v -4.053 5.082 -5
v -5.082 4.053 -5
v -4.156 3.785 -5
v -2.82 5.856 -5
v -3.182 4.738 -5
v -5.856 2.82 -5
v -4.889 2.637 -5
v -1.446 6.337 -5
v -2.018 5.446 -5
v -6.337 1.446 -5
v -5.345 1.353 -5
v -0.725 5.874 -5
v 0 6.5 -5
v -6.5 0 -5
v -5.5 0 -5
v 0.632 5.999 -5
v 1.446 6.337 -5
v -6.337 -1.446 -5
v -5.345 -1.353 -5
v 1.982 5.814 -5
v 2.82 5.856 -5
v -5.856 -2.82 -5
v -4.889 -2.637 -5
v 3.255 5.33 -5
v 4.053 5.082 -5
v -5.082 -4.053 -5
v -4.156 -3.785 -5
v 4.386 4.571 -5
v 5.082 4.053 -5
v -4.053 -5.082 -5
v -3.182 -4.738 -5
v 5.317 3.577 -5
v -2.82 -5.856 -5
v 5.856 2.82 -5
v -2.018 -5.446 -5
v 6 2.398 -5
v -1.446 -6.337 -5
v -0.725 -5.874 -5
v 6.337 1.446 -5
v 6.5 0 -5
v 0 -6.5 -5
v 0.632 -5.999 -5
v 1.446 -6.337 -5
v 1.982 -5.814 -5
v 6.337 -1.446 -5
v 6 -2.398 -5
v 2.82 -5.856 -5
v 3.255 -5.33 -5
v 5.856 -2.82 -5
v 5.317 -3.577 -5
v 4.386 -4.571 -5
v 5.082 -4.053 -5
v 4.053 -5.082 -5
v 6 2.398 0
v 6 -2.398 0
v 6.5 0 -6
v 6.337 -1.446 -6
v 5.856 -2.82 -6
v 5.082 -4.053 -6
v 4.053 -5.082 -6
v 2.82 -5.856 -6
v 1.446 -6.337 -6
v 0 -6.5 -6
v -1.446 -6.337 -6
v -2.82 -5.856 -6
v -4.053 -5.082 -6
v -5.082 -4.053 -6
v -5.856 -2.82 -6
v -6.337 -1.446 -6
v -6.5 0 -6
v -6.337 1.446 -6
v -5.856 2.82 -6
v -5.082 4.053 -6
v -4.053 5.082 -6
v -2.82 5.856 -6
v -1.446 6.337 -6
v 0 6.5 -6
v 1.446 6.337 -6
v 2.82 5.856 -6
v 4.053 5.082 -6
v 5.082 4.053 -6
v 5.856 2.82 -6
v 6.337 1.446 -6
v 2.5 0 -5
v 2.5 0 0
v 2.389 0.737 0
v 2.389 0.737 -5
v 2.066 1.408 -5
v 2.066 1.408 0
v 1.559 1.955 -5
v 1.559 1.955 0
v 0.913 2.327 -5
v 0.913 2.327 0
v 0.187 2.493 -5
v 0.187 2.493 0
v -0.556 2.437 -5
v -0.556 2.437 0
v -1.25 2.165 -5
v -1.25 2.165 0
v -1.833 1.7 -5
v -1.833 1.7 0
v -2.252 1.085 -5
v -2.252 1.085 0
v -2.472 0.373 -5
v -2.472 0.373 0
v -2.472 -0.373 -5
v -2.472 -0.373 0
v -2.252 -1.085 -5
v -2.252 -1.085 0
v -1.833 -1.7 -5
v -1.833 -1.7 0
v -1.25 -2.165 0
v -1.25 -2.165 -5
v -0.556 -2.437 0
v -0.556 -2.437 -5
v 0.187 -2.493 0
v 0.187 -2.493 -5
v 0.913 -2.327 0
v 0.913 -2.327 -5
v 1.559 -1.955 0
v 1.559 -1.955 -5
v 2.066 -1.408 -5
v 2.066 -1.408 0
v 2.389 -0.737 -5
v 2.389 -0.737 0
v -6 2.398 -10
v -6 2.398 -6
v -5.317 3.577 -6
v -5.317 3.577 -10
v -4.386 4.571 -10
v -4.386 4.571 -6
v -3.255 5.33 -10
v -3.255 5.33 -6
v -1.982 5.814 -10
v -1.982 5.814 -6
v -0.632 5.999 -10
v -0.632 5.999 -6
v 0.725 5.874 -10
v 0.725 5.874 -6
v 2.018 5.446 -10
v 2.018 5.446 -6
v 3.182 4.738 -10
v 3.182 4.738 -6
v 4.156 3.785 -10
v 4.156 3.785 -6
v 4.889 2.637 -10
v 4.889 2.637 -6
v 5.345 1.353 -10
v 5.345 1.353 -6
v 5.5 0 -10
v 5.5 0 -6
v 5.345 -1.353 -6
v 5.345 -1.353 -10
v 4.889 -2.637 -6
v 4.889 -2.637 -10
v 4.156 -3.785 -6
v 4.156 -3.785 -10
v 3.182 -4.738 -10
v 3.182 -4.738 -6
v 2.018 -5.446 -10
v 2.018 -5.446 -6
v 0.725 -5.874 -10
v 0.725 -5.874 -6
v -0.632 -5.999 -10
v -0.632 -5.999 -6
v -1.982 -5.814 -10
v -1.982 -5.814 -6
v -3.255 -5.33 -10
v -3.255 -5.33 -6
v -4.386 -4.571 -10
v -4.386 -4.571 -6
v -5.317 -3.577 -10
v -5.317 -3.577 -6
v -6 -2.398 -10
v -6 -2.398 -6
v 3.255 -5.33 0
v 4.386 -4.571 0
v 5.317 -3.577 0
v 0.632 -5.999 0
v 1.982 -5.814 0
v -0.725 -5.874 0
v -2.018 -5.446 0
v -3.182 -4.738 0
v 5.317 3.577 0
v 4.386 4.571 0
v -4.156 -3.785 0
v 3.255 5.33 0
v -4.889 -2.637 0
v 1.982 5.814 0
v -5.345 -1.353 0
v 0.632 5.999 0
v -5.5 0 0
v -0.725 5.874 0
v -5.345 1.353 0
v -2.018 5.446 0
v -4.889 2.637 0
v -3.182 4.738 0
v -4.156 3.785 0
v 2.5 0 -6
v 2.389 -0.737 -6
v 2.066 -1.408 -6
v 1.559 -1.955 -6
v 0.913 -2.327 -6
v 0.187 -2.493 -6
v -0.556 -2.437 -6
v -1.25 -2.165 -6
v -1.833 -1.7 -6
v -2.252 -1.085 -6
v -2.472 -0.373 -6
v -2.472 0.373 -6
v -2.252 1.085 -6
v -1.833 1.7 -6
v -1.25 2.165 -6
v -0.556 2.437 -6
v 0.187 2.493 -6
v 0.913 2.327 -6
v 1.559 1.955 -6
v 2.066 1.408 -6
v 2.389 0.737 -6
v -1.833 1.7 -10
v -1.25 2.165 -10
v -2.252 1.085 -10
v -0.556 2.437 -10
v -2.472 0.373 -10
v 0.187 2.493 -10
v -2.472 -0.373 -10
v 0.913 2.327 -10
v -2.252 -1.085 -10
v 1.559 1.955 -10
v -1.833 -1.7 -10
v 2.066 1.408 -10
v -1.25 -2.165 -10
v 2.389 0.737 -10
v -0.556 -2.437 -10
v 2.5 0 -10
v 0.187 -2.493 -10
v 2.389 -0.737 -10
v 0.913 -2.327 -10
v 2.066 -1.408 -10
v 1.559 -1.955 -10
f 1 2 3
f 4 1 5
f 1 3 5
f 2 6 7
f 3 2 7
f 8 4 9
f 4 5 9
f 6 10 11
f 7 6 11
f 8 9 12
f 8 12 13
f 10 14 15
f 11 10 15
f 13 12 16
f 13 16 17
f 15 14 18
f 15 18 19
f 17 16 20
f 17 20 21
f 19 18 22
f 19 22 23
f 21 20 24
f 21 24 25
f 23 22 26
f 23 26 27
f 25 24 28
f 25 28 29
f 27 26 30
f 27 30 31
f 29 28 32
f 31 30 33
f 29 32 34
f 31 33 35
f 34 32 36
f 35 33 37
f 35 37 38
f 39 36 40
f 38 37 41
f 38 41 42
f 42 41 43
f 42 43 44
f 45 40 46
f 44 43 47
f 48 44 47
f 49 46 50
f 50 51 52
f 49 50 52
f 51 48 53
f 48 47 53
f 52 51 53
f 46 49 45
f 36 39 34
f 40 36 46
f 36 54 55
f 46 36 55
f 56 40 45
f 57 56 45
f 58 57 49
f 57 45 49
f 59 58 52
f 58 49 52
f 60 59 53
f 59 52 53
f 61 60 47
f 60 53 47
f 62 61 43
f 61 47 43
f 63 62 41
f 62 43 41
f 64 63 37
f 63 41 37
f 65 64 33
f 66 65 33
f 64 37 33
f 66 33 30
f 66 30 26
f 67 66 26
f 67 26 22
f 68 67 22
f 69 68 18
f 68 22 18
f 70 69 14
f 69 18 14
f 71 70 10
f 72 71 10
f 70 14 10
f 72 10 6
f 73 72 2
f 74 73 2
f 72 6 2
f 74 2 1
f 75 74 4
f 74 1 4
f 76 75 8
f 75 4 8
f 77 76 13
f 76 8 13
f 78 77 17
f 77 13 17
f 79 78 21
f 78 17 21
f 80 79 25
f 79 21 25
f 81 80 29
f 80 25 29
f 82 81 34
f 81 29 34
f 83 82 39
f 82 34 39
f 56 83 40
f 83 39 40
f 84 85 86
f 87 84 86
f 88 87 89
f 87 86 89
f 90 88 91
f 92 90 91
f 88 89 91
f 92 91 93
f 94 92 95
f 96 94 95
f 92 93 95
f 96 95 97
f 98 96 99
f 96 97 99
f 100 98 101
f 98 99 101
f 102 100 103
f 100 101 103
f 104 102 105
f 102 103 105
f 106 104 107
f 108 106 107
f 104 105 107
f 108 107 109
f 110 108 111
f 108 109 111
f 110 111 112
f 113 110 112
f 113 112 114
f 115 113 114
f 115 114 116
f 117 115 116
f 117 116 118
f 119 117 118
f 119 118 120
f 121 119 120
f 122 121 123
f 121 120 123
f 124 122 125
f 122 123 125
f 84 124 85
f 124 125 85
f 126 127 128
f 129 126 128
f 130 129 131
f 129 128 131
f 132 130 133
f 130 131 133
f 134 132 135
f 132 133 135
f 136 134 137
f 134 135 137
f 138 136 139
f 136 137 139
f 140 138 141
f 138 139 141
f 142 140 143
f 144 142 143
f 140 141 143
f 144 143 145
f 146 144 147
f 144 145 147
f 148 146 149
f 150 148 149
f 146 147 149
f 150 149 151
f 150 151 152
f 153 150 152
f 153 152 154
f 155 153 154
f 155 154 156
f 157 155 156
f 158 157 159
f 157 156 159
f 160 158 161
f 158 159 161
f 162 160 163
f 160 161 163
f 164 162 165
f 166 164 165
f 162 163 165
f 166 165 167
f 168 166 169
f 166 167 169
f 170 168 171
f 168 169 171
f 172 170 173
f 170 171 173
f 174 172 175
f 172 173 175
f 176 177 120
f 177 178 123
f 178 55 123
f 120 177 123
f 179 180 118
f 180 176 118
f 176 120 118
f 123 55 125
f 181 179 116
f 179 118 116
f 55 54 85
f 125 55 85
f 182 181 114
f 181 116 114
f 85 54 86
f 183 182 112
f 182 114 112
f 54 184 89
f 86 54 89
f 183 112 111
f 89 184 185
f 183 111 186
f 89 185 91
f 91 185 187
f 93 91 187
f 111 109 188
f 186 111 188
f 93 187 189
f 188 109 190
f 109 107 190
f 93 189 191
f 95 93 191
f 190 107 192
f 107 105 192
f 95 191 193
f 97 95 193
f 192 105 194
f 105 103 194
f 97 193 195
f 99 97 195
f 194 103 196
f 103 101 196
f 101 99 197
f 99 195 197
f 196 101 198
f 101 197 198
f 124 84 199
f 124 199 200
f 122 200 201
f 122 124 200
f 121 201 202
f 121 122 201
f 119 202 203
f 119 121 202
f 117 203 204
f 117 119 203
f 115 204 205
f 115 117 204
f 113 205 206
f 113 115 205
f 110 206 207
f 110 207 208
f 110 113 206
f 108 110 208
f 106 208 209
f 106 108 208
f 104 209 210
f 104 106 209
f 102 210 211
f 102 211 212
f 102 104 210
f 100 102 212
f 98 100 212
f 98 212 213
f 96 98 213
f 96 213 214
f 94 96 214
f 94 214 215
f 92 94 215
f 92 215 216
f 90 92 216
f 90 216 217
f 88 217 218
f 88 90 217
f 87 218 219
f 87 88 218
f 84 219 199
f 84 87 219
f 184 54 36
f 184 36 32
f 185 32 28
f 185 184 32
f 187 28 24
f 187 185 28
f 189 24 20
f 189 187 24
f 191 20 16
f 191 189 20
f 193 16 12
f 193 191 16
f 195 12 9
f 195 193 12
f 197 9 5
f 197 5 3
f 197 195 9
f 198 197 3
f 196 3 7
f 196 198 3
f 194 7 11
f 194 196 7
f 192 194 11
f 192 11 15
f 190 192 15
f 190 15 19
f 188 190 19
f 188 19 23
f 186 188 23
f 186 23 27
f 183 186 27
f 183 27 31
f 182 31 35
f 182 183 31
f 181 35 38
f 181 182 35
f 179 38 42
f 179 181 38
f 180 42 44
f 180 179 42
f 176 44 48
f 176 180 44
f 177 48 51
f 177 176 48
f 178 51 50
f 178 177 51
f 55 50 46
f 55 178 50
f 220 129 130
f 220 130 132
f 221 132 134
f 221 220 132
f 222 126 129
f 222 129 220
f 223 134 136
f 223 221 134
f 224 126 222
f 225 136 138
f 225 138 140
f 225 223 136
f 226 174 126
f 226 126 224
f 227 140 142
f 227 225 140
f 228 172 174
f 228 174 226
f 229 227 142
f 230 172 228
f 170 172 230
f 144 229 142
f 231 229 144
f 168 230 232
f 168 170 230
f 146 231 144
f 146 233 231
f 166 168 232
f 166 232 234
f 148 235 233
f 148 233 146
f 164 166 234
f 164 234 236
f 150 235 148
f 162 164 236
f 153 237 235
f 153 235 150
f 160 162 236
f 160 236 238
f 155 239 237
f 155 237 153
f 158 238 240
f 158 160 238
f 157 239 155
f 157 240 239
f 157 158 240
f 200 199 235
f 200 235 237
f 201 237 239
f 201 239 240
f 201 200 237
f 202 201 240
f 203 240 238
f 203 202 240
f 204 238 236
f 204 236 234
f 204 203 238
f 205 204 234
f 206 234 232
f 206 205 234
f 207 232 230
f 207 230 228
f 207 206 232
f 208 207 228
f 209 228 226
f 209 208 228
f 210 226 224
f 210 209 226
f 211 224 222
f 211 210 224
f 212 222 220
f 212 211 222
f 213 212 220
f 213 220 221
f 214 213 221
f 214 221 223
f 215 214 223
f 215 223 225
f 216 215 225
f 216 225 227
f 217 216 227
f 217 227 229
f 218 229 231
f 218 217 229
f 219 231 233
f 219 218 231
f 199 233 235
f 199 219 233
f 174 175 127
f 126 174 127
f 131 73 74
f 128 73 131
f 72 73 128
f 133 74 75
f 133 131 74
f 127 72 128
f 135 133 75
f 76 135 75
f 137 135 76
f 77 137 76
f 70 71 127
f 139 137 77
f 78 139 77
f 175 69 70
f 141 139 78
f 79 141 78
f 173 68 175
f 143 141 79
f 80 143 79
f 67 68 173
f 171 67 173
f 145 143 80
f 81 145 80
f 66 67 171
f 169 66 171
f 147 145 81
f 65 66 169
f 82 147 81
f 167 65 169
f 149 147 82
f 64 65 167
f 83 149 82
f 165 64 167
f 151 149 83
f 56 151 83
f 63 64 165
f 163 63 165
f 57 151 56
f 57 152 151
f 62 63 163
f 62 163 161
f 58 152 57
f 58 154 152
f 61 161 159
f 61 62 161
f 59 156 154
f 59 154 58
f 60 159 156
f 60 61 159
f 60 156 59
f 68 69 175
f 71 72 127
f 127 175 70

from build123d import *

# Parameters (mm, degrees)
SKETCH_R      = 2.5
PAD_DEPTH     = 5
SKETCH001_R   = 6.5
SKETCH001_R_2 = 2.5
PAD001_DEPTH  = 1
SKETCH002_R   = 2.5
PAD002_DEPTH  = 4


with BuildPart() as part:
    # Sketch → Pad (new body)
    with BuildSketch(Plane.XY):
        with BuildLine():
            Line((6, 2.397916), (6, -2.397916))
            ThreePointArc((6, 2.397916), (-5.5, 0), (6, -2.397916))
        make_face()
        Circle(SKETCH_R, mode=Mode.SUBTRACT)
    extrude(amount=-PAD_DEPTH)

    # Sketch001 (on Face5 of Pad) → Pad001 (join)
    with BuildSketch(Plane(origin=(0, 0, -5), x_dir=(1, 0, 0), z_dir=(0, 0, -1))):
        Circle(SKETCH001_R)
        Circle(SKETCH001_R_2, mode=Mode.SUBTRACT)
    extrude(amount=PAD001_DEPTH)

    # Sketch002 (on Face8 of Pad001) → Pad002 (join)
    with BuildSketch(Plane(origin=(0, 0, -6), x_dir=(1, 0, 0), z_dir=(0, 0, -1))):
        with BuildLine():
            ThreePointArc((-6, -2.397916), (5.5, 0), (-6, 2.397916))
            Line((-6, 2.397916), (-6, -2.397916))
        make_face()
        Circle(SKETCH002_R, mode=Mode.SUBTRACT)
    extrude(amount=PAD002_DEPTH)


solid = part.part
